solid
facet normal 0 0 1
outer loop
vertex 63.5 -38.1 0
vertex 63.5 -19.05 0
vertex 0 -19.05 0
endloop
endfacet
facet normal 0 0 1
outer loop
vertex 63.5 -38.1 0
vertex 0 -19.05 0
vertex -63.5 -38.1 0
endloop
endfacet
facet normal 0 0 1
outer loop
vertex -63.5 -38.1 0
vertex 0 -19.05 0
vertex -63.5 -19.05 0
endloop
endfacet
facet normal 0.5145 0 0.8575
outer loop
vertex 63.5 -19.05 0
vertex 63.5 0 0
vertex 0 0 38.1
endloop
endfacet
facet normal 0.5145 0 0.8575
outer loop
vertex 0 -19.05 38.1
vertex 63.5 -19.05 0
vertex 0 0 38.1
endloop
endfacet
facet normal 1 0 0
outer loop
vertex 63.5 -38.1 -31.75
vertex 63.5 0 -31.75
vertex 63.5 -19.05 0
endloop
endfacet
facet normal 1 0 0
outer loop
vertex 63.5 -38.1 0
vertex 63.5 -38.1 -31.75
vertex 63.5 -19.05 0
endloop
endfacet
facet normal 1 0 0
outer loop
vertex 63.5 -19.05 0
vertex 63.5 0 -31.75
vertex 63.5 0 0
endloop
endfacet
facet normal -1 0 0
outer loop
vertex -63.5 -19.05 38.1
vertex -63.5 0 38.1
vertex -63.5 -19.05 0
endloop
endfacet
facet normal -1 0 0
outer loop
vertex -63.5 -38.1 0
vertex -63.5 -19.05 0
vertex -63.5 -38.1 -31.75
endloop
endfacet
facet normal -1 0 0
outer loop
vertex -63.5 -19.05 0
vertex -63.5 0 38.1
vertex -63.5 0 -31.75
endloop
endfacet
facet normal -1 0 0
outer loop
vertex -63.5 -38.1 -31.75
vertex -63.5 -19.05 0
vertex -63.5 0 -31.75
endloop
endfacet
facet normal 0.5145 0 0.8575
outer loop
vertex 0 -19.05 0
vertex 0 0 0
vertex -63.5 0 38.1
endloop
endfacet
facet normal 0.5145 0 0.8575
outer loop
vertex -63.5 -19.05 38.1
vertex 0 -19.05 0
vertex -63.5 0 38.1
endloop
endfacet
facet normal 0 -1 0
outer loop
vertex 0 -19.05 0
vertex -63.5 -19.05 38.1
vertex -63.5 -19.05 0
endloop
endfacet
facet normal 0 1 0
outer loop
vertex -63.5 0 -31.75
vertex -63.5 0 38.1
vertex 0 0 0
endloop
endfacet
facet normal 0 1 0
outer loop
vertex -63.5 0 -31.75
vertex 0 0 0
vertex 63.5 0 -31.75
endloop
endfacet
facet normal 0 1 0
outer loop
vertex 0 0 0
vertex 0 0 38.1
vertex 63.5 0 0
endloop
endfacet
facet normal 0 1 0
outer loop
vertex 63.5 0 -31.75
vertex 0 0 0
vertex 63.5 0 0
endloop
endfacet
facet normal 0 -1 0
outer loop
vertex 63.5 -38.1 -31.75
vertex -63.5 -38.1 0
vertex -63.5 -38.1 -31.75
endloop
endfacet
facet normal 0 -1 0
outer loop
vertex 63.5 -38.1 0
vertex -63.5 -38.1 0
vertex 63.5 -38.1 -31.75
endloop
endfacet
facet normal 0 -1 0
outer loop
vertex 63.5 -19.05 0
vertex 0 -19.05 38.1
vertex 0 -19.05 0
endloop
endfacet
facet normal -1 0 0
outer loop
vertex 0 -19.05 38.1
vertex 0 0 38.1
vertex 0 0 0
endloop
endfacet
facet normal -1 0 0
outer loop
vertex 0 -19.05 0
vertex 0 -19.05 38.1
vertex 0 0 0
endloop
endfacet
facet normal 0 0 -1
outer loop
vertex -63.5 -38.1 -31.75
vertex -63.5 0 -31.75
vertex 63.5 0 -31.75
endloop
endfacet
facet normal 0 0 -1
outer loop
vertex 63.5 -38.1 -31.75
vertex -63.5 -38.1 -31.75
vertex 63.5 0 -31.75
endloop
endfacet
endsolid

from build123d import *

# Parameters (mm, degrees)
F1_DEPTH = 38.1
F2_DEPTH = 19.05


with BuildPart() as f1:
    # F0 (on Front) → F1 (new body)
    with BuildSketch(Plane.XZ):
        Polygon((-63.5, 0), (-63.5, -31.75), (63.5, -31.75), (63.5, 0), (0, 0), align=None)
    extrude(amount=F1_DEPTH)

    # F0 (on Front) → F2 (join)
    with BuildSketch(Plane.XZ):
        Polygon((-63.5, 38.1), (-63.5, 0), (0, 0), align=None)
        Polygon((0, 0), (63.5, 0), (0, 38.1), align=None)
    extrude(amount=F2_DEPTH)


solid = f1.part
